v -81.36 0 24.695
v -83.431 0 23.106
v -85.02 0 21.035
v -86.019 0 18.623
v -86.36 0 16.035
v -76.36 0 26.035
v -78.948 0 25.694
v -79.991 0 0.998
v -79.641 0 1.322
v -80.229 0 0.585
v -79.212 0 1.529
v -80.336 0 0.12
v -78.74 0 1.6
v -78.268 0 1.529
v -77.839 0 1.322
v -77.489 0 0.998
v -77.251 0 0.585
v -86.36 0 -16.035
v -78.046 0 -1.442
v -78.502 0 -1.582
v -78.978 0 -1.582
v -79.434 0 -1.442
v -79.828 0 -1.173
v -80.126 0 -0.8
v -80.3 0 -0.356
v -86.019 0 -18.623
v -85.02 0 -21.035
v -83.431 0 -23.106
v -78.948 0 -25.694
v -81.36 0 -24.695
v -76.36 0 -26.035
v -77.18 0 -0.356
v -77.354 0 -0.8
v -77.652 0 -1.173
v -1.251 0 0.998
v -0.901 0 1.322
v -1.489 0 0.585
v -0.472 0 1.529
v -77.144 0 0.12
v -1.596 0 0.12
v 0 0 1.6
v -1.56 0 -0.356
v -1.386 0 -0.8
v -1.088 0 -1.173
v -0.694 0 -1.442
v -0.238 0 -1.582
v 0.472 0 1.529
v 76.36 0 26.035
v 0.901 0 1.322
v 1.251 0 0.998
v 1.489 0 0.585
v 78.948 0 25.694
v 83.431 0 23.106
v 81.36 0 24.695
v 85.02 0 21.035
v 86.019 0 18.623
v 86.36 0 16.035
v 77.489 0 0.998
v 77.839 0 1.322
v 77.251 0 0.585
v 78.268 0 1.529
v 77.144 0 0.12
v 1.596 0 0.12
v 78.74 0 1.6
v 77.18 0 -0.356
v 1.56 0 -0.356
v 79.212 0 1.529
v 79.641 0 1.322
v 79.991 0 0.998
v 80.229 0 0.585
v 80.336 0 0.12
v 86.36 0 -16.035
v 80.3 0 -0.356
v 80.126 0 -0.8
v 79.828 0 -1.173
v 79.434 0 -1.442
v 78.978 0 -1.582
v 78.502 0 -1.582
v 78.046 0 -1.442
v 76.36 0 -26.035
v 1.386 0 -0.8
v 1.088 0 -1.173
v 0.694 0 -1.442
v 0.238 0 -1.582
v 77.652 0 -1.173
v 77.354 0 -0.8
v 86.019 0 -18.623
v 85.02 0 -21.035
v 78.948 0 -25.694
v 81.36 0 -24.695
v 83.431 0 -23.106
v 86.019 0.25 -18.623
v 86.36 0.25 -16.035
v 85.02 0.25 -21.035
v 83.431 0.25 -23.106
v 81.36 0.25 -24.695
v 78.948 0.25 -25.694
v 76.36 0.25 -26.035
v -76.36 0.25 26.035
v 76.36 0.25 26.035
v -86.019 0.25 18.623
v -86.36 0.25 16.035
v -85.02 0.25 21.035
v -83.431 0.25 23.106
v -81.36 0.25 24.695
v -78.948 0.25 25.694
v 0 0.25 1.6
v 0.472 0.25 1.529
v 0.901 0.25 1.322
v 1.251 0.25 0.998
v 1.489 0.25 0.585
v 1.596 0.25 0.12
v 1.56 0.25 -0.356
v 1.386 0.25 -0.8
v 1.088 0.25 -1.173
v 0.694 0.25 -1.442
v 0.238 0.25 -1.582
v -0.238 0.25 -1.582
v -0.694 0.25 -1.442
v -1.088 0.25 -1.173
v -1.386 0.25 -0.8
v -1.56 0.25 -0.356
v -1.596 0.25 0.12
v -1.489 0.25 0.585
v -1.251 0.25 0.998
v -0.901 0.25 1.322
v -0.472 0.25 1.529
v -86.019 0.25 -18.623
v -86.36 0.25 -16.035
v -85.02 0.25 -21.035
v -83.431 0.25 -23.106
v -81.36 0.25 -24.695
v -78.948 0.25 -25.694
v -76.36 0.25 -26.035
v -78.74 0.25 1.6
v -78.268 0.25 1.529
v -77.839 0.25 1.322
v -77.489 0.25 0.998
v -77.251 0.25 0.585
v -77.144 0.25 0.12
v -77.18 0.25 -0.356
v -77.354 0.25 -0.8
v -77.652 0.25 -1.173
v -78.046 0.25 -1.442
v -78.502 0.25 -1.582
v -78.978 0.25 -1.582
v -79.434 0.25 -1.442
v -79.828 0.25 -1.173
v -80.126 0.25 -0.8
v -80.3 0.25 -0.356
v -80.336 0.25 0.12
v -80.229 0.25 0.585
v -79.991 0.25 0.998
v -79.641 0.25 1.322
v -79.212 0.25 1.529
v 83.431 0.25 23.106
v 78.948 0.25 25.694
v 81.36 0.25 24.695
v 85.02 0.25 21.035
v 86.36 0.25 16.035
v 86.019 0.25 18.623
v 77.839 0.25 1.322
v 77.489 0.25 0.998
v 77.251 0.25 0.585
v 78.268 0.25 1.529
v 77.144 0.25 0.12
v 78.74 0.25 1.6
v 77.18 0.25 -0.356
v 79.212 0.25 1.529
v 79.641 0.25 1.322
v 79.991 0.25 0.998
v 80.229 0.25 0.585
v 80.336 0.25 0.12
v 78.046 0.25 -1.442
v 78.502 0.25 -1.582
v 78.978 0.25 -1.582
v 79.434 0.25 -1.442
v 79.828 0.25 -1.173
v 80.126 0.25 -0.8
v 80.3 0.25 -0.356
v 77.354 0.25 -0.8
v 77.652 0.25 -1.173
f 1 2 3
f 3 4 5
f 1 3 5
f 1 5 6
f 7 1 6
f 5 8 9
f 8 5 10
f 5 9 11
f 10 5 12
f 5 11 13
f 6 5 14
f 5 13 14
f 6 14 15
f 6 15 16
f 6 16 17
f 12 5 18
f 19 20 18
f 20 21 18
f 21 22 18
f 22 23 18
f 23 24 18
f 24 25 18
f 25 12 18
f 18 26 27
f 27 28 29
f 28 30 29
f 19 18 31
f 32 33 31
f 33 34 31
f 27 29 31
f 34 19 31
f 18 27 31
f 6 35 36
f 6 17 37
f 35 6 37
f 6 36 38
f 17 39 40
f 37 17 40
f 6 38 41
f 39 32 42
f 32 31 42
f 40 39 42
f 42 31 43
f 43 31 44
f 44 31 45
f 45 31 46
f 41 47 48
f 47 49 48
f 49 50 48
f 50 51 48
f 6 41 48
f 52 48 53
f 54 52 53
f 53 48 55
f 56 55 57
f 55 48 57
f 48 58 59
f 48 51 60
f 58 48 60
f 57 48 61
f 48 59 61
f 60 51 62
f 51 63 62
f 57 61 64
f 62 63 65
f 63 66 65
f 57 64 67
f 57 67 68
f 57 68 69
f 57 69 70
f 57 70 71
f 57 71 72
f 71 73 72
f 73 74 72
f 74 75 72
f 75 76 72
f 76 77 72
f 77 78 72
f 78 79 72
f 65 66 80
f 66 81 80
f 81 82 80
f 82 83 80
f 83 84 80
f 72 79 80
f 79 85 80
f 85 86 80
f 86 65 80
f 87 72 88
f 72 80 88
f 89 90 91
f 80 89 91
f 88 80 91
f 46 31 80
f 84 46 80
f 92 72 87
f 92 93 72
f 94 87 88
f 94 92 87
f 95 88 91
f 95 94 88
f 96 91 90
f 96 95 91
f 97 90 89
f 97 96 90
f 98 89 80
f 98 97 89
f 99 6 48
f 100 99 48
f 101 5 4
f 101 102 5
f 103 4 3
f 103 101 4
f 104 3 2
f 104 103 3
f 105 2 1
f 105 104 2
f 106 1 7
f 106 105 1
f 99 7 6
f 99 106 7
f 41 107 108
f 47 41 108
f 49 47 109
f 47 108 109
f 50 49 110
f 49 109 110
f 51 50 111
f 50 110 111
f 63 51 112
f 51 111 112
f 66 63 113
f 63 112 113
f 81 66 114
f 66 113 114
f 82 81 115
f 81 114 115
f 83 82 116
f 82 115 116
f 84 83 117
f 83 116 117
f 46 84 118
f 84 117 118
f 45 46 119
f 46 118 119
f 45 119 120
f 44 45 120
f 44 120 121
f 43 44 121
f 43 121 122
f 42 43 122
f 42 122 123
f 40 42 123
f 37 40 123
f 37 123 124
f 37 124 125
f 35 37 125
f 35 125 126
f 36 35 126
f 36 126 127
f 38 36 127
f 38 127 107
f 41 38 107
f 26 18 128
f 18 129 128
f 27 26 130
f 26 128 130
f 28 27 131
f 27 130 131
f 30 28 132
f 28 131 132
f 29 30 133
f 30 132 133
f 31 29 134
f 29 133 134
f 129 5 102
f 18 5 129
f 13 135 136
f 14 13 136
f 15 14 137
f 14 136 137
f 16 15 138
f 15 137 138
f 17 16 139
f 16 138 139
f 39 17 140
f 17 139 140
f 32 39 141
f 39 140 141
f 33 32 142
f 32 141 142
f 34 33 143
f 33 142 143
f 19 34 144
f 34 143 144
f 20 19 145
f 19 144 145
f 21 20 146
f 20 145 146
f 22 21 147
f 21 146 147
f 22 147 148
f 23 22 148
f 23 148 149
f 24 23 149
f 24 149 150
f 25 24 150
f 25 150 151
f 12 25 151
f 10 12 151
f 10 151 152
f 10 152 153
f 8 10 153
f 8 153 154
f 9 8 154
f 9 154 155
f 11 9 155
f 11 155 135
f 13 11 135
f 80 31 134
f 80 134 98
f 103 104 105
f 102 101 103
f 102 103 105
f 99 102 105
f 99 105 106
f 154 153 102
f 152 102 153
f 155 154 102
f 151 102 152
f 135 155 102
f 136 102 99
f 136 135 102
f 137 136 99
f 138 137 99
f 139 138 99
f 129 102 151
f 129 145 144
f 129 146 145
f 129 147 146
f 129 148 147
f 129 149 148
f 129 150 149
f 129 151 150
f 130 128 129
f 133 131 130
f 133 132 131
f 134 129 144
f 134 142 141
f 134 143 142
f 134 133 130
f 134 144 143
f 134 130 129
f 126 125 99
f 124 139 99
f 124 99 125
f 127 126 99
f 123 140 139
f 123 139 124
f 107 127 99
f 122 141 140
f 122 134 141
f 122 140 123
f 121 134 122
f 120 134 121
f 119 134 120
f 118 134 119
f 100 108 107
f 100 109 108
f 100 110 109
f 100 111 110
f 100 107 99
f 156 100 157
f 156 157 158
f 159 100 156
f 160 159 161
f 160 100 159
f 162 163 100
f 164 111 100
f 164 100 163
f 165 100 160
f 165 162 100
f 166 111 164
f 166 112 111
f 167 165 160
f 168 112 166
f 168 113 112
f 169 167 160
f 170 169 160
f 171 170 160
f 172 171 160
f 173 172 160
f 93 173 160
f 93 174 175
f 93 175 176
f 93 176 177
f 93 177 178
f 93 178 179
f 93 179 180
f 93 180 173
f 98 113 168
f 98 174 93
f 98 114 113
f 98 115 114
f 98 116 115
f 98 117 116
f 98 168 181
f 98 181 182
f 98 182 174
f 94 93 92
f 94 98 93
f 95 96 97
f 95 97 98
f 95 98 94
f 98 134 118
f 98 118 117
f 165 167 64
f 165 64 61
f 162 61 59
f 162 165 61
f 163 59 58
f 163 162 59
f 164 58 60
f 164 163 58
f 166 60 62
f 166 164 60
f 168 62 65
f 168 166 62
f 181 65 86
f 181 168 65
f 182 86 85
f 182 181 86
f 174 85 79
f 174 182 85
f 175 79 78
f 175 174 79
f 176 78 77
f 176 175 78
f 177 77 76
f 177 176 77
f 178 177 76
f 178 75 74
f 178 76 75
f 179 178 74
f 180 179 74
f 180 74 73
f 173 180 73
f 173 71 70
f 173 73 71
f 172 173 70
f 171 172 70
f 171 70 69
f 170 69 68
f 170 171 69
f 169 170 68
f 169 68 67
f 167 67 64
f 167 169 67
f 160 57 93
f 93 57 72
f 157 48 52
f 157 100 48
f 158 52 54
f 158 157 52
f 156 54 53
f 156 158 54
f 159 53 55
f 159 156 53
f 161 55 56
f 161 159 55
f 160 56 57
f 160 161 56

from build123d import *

# Parameters (mm, degrees)
SKETCH1_W           = 172.72
SKETCH1_H           = 52.07
BOSS_EXTRUDE1_DEPTH = 0.25
FILLET1_R           = 10
SKETCH2_R           = 1.6
CUT_EXTRUDE1_DEPTH  = 91.199408673


with BuildPart() as part:
    # Sketch1 → Boss-Extrude1 (new body)
    with BuildSketch(Plane(origin=(0, 0, 0), x_dir=(1, 0, 0), z_dir=(0, 1, 0))):
        Rectangle(SKETCH1_W, SKETCH1_H)
    extrude(amount=BOSS_EXTRUDE1_DEPTH)

    # Fillet1
    fillet1_edges = [part.edges().sort_by_distance(p)[0] for p in [
        (86.36, 0.125, 26.035),
        (-86.36, 0.125, 26.035),
        (-86.36, 0.125, -26.035),
        (86.36, 0.125, -26.035),
    ]]
    fillet(fillet1_edges, radius=FILLET1_R)

    # Sketch2 → Cut-Extrude1 (cut, through all)
    with BuildSketch(Plane(origin=(0, 0.25, 0), x_dir=(1, 0, 0), z_dir=(0, 1, 0))):
        with Locations(Location((-78.74, 0, 0), (0, 0, 270))):
            Circle(SKETCH2_R)
        with Locations(Location((0, 0, 0), (0, 0, 270))):
            Circle(SKETCH2_R)
    cut_extrude1 = extrude(amount=-CUT_EXTRUDE1_DEPTH, mode=Mode.SUBTRACT)

    # Mirror1: Cut-Extrude1 across plane
    add(cut_extrude1.mirror(Plane(origin=(0, 0, 0), x_dir=(0, 0, 1), z_dir=(1, 0, 0))), mode=Mode.SUBTRACT)


solid = part.part
